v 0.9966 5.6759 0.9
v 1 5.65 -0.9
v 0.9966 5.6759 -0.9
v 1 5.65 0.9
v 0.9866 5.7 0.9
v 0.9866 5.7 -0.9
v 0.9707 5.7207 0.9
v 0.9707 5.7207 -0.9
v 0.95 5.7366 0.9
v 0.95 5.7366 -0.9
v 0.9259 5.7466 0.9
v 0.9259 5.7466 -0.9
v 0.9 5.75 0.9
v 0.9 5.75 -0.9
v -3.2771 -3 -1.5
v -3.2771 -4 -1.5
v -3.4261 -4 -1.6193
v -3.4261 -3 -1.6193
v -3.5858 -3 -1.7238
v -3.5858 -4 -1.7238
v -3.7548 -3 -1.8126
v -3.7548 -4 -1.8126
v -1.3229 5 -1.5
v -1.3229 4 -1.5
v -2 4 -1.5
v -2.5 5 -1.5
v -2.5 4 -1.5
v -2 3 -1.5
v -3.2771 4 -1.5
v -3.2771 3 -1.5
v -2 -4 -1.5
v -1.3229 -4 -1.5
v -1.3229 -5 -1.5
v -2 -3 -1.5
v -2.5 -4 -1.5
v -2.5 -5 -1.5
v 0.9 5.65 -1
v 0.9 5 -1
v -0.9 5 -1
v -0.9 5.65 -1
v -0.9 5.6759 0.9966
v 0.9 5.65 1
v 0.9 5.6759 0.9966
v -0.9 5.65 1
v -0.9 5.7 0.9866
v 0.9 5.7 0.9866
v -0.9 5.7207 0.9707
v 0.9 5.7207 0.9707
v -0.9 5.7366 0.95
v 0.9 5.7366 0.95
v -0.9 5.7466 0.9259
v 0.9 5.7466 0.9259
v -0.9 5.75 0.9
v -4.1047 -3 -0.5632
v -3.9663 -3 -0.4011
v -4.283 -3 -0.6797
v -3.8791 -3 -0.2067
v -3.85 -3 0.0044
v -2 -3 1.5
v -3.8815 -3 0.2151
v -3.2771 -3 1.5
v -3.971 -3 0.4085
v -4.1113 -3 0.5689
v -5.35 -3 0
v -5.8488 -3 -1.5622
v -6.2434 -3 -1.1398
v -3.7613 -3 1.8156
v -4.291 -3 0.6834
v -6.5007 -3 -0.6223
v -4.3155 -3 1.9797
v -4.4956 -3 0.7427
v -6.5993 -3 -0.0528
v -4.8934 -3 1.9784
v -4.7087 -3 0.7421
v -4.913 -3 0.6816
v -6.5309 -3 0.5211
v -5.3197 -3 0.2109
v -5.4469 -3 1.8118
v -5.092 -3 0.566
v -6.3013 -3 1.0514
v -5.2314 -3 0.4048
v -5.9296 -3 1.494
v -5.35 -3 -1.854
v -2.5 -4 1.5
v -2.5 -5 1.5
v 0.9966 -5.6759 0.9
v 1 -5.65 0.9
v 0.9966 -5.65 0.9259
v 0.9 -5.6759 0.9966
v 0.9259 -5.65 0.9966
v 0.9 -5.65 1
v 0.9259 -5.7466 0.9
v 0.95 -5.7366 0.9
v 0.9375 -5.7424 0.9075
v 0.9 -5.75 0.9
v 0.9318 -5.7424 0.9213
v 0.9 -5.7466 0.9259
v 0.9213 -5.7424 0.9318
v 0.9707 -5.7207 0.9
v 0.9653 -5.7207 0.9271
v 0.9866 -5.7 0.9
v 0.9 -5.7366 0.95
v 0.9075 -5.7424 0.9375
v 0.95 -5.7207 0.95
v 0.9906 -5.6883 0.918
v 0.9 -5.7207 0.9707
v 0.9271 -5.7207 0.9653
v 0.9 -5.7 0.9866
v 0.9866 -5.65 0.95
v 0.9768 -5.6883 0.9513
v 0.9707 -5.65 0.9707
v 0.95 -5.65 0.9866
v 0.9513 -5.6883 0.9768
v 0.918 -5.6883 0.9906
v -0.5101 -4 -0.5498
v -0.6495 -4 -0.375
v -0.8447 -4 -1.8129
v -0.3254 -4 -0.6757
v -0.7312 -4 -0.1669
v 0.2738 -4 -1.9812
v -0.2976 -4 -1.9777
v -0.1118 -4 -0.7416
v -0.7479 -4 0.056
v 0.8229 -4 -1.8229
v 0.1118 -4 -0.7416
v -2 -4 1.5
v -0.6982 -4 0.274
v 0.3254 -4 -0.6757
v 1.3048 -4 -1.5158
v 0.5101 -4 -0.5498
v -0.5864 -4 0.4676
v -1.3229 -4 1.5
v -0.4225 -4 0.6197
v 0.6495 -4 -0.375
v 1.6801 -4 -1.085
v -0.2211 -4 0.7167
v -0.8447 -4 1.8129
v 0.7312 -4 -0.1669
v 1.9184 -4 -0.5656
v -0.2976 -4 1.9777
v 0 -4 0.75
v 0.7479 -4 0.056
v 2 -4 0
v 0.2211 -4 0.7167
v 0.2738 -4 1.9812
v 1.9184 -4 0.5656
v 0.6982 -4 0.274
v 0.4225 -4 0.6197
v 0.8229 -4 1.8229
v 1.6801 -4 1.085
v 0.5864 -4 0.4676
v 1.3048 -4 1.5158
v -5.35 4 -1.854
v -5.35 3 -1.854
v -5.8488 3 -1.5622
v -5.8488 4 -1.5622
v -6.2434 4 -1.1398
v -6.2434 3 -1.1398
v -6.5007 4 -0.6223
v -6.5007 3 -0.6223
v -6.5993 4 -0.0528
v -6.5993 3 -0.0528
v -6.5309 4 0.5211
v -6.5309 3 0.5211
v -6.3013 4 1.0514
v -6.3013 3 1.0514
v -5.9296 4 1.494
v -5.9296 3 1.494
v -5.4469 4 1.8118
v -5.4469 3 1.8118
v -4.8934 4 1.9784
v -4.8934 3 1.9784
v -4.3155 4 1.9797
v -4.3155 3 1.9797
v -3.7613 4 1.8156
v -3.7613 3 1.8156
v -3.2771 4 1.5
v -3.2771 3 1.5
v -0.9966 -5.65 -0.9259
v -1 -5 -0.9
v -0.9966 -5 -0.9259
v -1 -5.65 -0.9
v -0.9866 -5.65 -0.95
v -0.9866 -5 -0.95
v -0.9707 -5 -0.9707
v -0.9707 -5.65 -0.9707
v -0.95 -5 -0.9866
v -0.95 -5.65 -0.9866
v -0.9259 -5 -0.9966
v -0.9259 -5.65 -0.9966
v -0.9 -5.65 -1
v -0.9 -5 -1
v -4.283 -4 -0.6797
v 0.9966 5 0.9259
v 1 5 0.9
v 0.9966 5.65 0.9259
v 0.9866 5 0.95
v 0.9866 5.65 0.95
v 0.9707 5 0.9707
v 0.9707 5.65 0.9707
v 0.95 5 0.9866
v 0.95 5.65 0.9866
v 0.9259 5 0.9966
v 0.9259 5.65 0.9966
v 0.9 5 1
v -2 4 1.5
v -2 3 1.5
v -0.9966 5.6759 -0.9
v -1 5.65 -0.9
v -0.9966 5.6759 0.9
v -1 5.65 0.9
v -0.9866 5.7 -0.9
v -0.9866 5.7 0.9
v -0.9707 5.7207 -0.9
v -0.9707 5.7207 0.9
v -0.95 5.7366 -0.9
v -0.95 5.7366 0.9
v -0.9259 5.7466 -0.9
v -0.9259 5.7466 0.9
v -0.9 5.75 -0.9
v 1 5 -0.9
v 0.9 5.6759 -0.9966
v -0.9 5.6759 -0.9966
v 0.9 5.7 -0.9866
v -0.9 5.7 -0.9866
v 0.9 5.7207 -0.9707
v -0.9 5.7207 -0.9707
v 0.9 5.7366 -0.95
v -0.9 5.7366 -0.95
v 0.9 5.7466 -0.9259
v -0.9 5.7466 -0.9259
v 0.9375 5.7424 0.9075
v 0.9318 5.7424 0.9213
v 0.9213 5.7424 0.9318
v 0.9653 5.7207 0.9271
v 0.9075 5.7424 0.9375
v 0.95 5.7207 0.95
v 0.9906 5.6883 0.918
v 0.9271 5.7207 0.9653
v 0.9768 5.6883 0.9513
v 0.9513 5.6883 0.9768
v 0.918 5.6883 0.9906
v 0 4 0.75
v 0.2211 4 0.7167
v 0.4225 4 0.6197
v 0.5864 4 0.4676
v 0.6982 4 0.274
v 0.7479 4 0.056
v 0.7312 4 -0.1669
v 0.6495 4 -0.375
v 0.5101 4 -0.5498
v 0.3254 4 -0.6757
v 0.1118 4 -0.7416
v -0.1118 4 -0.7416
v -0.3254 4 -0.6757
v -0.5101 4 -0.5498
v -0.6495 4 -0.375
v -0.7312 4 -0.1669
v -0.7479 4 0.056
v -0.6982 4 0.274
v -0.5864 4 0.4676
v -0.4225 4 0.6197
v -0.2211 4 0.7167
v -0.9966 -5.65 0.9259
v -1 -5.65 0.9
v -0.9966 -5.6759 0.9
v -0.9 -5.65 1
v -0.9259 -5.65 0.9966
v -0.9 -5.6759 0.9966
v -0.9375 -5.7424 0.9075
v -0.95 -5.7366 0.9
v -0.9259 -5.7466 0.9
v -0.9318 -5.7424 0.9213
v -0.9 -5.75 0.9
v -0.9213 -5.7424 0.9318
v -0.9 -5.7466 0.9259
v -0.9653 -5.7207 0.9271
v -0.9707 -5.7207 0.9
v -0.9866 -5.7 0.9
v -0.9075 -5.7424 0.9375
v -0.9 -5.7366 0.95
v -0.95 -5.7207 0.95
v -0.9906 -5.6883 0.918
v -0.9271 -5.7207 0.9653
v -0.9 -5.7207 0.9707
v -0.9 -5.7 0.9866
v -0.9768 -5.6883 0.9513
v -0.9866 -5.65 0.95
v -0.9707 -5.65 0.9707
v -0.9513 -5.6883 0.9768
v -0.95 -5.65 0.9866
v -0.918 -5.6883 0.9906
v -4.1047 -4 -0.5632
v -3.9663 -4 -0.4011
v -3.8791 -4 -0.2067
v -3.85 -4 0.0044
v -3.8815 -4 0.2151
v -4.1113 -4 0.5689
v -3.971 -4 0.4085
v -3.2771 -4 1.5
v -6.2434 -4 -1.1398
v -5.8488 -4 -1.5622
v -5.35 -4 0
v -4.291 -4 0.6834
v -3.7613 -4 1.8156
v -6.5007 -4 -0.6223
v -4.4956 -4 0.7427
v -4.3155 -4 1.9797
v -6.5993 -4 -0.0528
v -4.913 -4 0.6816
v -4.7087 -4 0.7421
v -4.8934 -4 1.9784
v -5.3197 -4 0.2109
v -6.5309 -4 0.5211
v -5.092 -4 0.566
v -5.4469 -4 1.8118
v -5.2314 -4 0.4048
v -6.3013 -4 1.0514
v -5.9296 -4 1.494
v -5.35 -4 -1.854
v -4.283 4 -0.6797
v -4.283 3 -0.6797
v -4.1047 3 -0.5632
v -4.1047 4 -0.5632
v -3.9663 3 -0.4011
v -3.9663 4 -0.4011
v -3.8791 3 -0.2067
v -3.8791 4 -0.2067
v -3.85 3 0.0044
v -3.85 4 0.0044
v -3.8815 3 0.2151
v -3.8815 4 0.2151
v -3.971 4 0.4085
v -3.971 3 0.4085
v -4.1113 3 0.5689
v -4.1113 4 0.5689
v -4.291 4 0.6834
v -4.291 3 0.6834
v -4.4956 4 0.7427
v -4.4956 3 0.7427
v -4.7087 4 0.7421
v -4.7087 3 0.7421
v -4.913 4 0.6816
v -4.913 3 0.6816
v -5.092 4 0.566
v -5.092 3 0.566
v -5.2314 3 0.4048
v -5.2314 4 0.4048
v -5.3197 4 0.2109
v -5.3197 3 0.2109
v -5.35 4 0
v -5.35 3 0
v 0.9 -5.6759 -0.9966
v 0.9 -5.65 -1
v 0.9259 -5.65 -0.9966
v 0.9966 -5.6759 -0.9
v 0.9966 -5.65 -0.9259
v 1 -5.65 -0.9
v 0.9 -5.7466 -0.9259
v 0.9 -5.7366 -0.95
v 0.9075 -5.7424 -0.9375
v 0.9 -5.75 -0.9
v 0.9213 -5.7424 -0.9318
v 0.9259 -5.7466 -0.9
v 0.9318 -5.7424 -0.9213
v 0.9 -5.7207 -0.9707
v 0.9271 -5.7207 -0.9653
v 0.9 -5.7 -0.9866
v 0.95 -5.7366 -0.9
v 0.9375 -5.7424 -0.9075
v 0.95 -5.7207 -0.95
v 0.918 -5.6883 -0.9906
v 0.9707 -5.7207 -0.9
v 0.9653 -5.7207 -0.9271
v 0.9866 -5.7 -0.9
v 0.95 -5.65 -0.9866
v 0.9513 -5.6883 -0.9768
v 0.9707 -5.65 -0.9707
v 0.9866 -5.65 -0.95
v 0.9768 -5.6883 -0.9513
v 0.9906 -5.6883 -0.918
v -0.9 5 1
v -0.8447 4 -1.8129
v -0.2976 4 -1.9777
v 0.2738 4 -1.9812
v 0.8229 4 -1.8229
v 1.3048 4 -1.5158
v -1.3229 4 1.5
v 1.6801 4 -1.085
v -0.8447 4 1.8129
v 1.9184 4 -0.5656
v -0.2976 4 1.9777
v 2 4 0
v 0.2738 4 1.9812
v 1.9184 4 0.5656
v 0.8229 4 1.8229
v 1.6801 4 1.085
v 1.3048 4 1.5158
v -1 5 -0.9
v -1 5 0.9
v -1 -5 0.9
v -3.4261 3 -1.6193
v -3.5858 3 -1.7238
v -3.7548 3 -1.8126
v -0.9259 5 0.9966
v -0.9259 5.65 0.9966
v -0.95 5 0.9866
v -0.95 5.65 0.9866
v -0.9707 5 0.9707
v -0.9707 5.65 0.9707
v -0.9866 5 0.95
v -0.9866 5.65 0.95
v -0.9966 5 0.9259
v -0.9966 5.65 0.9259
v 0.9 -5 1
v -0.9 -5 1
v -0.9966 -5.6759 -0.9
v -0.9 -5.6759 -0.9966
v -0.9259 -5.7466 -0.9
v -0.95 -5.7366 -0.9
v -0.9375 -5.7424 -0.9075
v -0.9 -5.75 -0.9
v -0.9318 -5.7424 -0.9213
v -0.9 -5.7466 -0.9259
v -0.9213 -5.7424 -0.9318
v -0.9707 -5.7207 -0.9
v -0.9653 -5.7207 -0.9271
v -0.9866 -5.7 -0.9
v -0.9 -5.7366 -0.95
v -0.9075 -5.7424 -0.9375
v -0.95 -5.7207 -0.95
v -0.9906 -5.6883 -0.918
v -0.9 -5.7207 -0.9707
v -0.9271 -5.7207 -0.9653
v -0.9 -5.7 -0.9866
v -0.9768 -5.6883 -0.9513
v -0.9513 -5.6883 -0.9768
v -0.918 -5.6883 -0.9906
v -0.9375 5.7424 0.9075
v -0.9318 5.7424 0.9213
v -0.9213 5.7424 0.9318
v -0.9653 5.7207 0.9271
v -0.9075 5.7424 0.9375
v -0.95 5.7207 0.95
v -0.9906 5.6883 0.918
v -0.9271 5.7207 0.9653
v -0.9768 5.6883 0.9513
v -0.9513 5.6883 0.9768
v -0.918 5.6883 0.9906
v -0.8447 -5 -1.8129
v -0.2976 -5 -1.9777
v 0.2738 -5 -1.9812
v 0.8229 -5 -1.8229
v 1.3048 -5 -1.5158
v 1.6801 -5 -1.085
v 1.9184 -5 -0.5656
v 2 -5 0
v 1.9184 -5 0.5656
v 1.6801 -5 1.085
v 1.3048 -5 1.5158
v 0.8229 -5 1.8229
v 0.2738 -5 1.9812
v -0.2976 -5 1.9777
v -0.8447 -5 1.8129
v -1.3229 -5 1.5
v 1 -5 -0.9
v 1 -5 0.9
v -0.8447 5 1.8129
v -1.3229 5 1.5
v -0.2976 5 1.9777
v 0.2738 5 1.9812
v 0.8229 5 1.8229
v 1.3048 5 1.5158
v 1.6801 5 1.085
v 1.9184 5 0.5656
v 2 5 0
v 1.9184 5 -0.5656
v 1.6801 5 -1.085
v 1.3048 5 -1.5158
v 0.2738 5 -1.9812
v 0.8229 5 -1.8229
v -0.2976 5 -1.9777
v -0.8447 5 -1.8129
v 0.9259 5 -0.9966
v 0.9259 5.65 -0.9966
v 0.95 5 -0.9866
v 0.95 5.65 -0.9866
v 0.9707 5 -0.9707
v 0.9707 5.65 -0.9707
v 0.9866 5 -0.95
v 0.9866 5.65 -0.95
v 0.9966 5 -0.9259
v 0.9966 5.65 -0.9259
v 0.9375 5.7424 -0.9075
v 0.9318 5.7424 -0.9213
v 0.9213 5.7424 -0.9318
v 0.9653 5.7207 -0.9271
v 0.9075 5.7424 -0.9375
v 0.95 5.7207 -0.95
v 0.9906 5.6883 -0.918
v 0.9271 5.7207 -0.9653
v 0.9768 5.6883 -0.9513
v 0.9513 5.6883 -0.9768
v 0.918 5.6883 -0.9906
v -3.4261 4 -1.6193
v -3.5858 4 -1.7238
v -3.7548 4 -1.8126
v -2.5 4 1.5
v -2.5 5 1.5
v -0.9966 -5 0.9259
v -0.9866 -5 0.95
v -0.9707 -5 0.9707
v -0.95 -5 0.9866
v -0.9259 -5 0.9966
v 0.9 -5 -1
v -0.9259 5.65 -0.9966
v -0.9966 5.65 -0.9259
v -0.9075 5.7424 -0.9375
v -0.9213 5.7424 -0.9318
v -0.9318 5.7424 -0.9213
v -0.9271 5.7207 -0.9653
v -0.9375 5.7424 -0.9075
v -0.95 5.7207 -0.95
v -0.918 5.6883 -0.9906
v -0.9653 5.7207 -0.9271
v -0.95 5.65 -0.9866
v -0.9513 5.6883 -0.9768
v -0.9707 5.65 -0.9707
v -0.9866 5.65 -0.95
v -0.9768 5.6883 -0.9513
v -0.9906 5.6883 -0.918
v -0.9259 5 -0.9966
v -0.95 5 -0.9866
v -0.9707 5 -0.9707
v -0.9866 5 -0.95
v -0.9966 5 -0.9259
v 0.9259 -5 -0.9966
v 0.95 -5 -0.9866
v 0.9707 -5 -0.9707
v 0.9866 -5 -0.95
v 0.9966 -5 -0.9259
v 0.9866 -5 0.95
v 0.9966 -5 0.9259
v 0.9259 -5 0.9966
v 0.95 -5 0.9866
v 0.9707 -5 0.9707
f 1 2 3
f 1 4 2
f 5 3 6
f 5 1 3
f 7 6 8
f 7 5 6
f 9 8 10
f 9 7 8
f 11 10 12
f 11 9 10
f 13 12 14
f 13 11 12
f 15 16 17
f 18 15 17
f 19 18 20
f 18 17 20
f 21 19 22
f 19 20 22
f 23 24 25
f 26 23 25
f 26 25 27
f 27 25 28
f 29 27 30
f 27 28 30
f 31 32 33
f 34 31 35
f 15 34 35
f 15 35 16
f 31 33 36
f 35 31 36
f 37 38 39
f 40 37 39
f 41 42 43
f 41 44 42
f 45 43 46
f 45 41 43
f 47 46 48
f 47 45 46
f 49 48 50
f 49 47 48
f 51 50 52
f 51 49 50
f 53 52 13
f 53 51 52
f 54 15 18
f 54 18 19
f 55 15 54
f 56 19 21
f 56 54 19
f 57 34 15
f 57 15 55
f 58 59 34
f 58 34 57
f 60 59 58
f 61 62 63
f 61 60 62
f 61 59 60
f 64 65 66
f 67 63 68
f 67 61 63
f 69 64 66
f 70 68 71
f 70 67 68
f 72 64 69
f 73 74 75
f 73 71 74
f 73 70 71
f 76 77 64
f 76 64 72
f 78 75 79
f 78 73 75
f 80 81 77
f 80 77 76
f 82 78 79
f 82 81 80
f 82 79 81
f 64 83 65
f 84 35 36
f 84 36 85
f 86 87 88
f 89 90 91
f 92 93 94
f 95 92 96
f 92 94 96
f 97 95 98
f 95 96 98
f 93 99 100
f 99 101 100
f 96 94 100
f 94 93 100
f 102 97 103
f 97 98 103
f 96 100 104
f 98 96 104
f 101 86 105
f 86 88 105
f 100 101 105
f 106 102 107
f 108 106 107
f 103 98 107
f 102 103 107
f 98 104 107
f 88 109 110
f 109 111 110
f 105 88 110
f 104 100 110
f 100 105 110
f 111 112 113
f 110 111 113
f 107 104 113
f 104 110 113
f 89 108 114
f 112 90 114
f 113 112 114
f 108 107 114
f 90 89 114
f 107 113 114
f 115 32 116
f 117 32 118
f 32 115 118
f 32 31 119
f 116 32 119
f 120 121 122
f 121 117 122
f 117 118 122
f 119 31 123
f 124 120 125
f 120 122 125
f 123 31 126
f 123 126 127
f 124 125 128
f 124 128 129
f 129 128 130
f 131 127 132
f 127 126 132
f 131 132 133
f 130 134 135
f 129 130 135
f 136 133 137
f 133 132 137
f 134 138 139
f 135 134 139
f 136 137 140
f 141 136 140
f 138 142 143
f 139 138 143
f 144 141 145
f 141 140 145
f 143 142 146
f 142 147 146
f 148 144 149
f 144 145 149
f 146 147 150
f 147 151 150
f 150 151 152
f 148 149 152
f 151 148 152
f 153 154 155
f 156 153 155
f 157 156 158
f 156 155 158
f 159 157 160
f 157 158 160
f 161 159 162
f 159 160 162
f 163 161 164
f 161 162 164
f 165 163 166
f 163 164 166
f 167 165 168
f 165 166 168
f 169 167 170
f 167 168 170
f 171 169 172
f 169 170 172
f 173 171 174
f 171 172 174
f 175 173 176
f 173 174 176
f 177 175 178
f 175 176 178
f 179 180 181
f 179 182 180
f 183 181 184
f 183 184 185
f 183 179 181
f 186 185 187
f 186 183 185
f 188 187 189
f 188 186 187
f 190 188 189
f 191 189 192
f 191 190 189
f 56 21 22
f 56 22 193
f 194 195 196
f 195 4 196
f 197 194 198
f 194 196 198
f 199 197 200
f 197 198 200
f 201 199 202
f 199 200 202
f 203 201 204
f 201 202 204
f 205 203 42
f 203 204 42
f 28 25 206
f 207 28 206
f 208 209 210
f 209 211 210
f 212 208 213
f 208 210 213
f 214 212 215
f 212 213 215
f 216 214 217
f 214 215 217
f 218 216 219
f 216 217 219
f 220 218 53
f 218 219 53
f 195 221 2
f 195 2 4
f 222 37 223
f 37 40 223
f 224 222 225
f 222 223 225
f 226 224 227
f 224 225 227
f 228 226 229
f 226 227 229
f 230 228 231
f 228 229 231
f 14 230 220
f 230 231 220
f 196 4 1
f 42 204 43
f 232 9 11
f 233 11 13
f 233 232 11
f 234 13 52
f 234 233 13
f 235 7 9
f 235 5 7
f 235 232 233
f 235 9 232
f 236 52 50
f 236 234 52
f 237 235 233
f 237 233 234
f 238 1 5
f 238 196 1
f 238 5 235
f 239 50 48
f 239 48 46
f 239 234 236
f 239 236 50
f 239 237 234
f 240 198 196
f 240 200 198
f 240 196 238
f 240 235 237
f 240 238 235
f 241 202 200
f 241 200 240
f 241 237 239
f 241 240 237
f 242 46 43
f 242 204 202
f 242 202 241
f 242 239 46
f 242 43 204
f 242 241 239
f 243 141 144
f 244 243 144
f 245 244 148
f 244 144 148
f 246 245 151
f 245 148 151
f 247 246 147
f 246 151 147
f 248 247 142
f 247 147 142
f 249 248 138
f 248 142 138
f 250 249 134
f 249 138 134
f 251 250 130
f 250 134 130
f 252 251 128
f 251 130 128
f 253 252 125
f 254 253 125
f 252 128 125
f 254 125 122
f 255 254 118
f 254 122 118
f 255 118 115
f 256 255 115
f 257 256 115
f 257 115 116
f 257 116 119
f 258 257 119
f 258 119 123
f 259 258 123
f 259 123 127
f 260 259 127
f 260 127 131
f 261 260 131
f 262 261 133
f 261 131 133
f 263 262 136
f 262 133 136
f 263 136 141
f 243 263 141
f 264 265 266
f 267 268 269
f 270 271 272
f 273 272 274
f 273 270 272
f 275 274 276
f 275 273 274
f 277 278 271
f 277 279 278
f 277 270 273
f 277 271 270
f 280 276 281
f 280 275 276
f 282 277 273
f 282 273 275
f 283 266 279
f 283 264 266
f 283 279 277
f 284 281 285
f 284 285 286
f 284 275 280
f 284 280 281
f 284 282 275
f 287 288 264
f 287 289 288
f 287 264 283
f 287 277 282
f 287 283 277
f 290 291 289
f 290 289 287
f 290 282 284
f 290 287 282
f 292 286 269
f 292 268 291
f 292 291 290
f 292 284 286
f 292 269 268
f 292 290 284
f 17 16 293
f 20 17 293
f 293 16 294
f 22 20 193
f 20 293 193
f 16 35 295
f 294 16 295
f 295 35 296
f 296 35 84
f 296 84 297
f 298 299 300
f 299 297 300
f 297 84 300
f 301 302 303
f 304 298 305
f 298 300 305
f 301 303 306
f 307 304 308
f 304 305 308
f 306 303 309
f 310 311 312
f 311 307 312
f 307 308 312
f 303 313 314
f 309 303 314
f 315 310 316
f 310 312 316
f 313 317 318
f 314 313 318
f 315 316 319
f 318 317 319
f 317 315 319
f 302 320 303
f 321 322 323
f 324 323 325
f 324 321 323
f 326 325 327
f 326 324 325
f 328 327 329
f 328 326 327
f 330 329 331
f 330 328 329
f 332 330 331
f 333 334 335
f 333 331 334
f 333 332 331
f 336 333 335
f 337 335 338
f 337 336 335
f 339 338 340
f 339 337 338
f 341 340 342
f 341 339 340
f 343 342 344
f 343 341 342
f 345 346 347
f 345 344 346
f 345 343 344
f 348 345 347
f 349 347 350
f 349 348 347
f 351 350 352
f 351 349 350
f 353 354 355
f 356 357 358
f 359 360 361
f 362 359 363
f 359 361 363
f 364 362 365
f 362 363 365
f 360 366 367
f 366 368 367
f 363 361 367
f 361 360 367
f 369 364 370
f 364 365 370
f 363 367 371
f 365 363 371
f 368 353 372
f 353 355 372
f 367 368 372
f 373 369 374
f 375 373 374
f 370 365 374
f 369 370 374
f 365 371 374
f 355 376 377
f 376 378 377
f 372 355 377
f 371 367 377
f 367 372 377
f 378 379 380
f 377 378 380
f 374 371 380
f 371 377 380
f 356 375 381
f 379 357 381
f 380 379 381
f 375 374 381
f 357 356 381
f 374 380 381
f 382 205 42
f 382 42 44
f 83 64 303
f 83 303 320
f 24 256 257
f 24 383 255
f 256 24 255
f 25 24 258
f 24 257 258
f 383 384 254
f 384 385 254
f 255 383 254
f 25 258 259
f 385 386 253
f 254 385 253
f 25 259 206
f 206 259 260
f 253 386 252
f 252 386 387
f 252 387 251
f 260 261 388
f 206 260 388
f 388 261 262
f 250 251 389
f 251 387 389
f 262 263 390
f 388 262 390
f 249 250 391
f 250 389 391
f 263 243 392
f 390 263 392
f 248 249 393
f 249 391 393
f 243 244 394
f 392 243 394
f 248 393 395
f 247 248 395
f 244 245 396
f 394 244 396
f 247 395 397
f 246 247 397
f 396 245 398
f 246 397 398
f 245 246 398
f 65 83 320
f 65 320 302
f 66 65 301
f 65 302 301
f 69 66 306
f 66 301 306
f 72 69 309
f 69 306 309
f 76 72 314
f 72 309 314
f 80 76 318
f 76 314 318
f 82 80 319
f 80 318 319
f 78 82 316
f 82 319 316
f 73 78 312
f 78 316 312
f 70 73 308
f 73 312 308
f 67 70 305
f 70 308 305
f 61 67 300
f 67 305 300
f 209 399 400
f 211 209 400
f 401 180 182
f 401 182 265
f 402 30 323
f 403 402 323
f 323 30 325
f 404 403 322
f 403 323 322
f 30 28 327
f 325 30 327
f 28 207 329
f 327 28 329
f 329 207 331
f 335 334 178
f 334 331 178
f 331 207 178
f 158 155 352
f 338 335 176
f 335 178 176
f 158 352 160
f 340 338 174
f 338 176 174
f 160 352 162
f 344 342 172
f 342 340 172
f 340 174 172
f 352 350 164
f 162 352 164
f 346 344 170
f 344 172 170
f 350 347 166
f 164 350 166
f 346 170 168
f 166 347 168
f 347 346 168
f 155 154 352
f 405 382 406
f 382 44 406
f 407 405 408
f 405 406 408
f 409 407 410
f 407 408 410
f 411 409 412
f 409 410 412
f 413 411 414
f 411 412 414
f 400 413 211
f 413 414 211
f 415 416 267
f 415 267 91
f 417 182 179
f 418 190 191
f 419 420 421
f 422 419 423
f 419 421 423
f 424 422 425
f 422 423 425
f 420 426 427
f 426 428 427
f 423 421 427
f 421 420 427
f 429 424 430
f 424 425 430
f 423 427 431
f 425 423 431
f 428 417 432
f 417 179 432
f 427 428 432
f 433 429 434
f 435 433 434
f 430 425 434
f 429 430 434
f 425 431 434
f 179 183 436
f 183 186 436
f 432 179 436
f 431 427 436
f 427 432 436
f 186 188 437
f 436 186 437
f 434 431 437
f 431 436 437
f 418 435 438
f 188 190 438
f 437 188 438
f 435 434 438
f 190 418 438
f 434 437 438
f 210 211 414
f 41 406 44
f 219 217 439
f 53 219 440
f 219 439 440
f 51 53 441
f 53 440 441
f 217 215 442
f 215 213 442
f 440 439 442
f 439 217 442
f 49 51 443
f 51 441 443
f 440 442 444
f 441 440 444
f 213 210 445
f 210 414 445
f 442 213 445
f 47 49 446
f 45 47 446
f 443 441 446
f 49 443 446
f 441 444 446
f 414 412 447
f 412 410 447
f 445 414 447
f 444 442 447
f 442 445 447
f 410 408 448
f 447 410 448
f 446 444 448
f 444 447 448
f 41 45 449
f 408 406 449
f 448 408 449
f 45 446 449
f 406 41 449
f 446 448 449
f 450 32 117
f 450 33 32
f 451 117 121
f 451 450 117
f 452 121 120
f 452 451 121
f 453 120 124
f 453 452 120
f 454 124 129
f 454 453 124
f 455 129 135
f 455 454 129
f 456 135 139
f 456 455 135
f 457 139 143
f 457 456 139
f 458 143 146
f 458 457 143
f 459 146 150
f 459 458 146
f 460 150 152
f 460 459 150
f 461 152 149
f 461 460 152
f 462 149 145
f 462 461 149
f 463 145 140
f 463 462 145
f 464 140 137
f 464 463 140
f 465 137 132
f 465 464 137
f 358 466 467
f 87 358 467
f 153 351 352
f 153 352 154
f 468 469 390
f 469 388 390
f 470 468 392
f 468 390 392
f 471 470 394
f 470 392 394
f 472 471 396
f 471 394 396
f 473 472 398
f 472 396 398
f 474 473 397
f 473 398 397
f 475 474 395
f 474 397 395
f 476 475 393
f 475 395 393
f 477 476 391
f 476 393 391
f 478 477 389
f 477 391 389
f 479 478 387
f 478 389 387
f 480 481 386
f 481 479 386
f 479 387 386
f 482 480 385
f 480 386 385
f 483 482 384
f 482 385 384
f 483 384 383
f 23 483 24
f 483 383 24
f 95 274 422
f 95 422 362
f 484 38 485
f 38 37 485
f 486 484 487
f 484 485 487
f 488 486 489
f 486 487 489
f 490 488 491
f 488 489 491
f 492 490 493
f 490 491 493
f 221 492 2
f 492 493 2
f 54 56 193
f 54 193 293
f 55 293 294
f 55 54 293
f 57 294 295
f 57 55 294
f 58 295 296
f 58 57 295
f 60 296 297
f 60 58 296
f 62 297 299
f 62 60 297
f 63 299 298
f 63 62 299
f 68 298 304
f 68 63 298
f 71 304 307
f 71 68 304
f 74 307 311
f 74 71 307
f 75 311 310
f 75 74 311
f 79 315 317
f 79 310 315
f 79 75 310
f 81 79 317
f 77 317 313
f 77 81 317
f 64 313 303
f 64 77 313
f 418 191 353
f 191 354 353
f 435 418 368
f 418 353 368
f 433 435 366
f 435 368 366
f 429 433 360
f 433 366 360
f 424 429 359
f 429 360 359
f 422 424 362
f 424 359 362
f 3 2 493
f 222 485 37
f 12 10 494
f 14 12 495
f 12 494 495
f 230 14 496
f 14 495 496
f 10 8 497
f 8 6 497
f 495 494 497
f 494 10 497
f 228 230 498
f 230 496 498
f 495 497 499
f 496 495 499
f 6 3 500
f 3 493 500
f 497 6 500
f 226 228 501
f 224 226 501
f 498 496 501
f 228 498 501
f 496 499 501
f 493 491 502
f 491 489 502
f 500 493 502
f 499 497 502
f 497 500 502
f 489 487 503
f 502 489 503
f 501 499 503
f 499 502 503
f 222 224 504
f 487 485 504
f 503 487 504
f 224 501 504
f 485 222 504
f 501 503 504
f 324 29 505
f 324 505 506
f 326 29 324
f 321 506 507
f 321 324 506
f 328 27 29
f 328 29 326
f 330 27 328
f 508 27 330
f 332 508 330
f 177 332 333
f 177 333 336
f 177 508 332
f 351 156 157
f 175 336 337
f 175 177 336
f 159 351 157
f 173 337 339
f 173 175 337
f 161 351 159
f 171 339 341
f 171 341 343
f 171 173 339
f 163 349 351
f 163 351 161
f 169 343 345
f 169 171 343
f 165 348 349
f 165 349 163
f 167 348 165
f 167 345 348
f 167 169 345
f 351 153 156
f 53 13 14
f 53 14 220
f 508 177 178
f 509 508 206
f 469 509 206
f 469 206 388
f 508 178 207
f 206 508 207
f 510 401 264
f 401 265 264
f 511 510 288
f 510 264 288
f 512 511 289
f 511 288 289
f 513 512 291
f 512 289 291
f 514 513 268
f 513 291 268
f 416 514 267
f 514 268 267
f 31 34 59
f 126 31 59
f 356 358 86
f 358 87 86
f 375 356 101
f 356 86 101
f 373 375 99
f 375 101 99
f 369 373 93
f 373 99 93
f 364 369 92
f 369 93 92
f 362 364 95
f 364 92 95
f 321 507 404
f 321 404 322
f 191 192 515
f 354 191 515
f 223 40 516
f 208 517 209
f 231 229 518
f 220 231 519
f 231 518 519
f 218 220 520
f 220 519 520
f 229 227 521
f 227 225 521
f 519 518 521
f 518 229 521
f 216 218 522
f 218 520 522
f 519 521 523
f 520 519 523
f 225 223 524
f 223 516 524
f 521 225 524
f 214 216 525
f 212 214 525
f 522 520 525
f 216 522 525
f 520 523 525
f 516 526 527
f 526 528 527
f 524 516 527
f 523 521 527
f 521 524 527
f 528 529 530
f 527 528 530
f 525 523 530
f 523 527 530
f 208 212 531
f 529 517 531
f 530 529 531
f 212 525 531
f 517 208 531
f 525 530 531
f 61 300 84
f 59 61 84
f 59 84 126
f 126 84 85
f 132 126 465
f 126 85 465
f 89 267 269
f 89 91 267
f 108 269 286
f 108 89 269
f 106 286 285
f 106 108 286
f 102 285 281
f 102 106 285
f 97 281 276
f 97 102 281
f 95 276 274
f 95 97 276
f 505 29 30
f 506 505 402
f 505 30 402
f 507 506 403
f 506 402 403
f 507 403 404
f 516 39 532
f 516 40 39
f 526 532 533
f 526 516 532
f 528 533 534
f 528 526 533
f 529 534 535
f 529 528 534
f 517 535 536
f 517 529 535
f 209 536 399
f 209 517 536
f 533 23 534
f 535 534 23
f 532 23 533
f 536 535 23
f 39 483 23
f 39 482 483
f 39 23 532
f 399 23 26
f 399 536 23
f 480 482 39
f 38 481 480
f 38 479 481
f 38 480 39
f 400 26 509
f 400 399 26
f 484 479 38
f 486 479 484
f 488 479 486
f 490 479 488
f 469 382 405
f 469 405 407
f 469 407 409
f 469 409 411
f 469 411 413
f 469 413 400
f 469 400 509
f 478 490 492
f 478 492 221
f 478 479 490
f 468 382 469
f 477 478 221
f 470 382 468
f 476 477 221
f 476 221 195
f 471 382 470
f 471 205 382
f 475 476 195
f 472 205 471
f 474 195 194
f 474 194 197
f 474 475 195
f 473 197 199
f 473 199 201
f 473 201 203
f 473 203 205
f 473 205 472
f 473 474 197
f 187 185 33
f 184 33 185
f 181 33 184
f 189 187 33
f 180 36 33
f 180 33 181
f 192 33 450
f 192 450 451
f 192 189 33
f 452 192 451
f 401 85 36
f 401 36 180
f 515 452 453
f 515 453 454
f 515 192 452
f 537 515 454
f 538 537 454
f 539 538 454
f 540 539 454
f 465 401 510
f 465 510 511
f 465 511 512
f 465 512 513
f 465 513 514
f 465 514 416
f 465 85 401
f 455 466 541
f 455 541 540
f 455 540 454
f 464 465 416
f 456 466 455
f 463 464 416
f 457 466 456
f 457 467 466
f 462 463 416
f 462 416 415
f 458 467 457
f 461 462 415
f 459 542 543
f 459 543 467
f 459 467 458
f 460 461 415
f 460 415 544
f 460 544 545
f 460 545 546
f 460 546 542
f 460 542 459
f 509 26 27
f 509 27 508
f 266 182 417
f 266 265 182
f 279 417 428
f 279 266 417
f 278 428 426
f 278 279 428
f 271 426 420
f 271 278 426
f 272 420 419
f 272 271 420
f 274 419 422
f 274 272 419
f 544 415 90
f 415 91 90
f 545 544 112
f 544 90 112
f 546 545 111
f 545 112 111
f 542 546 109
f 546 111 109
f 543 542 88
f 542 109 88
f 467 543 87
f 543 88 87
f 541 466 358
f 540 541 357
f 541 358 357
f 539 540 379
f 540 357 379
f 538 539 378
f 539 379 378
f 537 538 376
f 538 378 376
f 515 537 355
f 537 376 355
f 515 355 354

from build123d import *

# Parameters (mm, degrees)
EXTRUDE_1_DEPTH      = 4
EXTRUDE_1_DEPTH_BACK = 4
SKETCH_1_R           = 0.75
SKETCH_2_R           = 2
EXTRUDE_2_DEPTH      = 1
EXTRUDE_START        = 1
SKETCH_3_R           = 2
EXTRUDE_3_DEPTH      = 1
SKETCH_4_W           = 2
SKETCH_4_H           = 2
EXTRUDE_4_DEPTH      = 0.75
SKETCH_5_W           = 2
SKETCH_5_H           = 2
EXTRUDE_5_DEPTH      = 0.75
SKETCH_6_W           = 1.5
SKETCH_6_H           = 3
EXTRUDE_6_DEPTH      = 1
SKETCH_7_W           = 1.5
SKETCH_7_H           = 3
EXTRUDE_8_DEPTH      = 1
SKETCH_8_W           = 3
SKETCH_8_H           = 2
EXTRUDE_9_DEPTH      = 0.5
EXTRUDE_10_DEPTH     = 1
EXTRUDE_START_2      = 7
EXTRUDE_11_DEPTH     = 1
CUT_EXTRUDE_1_DEPTH  = 12.942466244
FILLET_1_R           = 0.1


with BuildPart() as part:
    # 草图1 → 凸台-拉伸1 (new, two sides: drawn at the far end of the back side and taken through both)
    with BuildSketch(Plane(origin=(0, 0, 0), x_dir=(1, 0, 0), z_dir=(0, 1, 0)).offset(-EXTRUDE_1_DEPTH_BACK)):
        with Locations(Location((0, 0, 0), (0, 0, 270))):
            Circle(SKETCH_1_R)
    extrude(amount=EXTRUDE_1_DEPTH + EXTRUDE_1_DEPTH_BACK)

    # 草图2 → 凸台-拉伸2 (add)
    with BuildSketch(Plane(origin=(0, 4, 0), x_dir=(-1, 0, 0), z_dir=(0, 1, 0))):
        with Locations(Location((0, 0, 0), (0, 0, 90))):
            Circle(SKETCH_2_R)
    extrude(amount=EXTRUDE_2_DEPTH)

    # 草图3 → 凸台-拉伸3 (add)
    with BuildSketch(Plane.XZ.offset(4).offset(EXTRUDE_START)):
        with Locations(Location((0, 0, 0), (0, 0, 90))):
            Circle(SKETCH_3_R)
    extrude(amount=-EXTRUDE_3_DEPTH)

    # 草图4 → 凸台-拉伸4 (add)
    with BuildSketch(Plane(origin=(0, 5, 0), x_dir=(-1, 0, 0), z_dir=(0, 1, 0))):
        Rectangle(SKETCH_4_W, SKETCH_4_H)
    extrude(amount=EXTRUDE_4_DEPTH)

    # 草图5 → 凸台-拉伸5 (add)
    with BuildSketch(Plane.XZ.offset(5)):
        Rectangle(SKETCH_5_W, SKETCH_5_H)
    extrude(amount=EXTRUDE_5_DEPTH)

    # 草图6 → 凸台-拉伸6 (add)
    with BuildSketch(Plane(origin=(0, 5, 0), x_dir=(-1, 0, 0), z_dir=(0, 1, 0))):
        with Locations((1.75, 0)):
            Rectangle(SKETCH_6_W, SKETCH_6_H)
    extrude(amount=-EXTRUDE_6_DEPTH)

    # 草图7 → 凸台-拉伸8 (add)
    with BuildSketch(Plane.XZ.offset(5)):
        with Locations((-1.75, 0)):
            Rectangle(SKETCH_7_W, SKETCH_7_H)
    extrude(amount=-EXTRUDE_8_DEPTH)

    # 草图8 → 凸台-拉伸9 (add)
    with BuildSketch(Plane.ZY.offset(2.5)):
        with Locations((0, 4)):
            Rectangle(SKETCH_8_W, SKETCH_8_H)
        with Locations((0, -4)):
            Rectangle(SKETCH_8_W, SKETCH_8_H)
    extrude(amount=-EXTRUDE_9_DEPTH)

    # 草图9 → 凸台-拉伸10 (add)
    with BuildSketch(Plane.XZ.offset(-3)):
        with BuildLine():
            Line((-2.5, -1.5), (-3.277124344, -1.5))
            ThreePointArc((-3.277124344, -1.5), (-6.6, 0), (-3.277124344, 1.5))
            Line((-3.277124344, 1.5), (-2.5, 1.5))
            Line((-2.5, 1.5), (-2.5, -1.5))
        make_face()
    extrude(amount=-EXTRUDE_10_DEPTH)

    # 草图9<2> → 凸台-拉伸11 (add)
    with BuildSketch(Plane.XZ.offset(-3).offset(EXTRUDE_START_2)):
        with BuildLine():
            Line((-2.5, -1.5), (-3.277124344, -1.5))
            ThreePointArc((-3.277124344, -1.5), (-6.6, 0), (-3.277124344, 1.5))
            Line((-3.277124344, 1.5), (-2.5, 1.5))
            Line((-2.5, 1.5), (-2.5, -1.5))
        make_face()
    extrude(amount=-EXTRUDE_11_DEPTH)

    # 草图10 → 切除-拉伸1 (cut, through all)
    with BuildSketch(Plane(origin=(0, 4, 0), x_dir=(-1, 0, 0), z_dir=(0, 1, 0))):
        with BuildLine():
            Line((5.35, 0), (5.35, -1.854049622))
            ThreePointArc((5.35, -1.854049622), (4.548070298, -1.999325713), (3.754763477, -1.812615574))
            Line((3.754763477, -1.812615574), (4.283036304, -0.67973084))
            ThreePointArc((4.283036304, -0.67973084), (4.197025294, 0.632543584), (5.35, 0))
        make_face()
    extrude(amount=-CUT_EXTRUDE_1_DEPTH, mode=Mode.SUBTRACT)

    # 圆角1
    fillet_1_edges = [part.edges().sort_by_distance(p)[0] for p in [
        (1, 5.375, 1),
        (1, 5.375, -1),
        (-1, 5.375, -1),
        (-1, 5.375, 1),
        (1, 5.75, 0),
        (0, 5.75, -1),
        (-1, 5.75, 0),
        (0, 5.75, 1),
        (-1, -5.375, 1),
        (-1, -5.375, -1),
        (1, -5.375, -1),
        (1, -5.375, 1),
        (-1, -5.75, 0),
        (0, -5.75, -1),
        (1, -5.75, 0),
        (0, -5.75, 1),
    ]]
    fillet(fillet_1_edges, radius=FILLET_1_R)


solid = part.part
